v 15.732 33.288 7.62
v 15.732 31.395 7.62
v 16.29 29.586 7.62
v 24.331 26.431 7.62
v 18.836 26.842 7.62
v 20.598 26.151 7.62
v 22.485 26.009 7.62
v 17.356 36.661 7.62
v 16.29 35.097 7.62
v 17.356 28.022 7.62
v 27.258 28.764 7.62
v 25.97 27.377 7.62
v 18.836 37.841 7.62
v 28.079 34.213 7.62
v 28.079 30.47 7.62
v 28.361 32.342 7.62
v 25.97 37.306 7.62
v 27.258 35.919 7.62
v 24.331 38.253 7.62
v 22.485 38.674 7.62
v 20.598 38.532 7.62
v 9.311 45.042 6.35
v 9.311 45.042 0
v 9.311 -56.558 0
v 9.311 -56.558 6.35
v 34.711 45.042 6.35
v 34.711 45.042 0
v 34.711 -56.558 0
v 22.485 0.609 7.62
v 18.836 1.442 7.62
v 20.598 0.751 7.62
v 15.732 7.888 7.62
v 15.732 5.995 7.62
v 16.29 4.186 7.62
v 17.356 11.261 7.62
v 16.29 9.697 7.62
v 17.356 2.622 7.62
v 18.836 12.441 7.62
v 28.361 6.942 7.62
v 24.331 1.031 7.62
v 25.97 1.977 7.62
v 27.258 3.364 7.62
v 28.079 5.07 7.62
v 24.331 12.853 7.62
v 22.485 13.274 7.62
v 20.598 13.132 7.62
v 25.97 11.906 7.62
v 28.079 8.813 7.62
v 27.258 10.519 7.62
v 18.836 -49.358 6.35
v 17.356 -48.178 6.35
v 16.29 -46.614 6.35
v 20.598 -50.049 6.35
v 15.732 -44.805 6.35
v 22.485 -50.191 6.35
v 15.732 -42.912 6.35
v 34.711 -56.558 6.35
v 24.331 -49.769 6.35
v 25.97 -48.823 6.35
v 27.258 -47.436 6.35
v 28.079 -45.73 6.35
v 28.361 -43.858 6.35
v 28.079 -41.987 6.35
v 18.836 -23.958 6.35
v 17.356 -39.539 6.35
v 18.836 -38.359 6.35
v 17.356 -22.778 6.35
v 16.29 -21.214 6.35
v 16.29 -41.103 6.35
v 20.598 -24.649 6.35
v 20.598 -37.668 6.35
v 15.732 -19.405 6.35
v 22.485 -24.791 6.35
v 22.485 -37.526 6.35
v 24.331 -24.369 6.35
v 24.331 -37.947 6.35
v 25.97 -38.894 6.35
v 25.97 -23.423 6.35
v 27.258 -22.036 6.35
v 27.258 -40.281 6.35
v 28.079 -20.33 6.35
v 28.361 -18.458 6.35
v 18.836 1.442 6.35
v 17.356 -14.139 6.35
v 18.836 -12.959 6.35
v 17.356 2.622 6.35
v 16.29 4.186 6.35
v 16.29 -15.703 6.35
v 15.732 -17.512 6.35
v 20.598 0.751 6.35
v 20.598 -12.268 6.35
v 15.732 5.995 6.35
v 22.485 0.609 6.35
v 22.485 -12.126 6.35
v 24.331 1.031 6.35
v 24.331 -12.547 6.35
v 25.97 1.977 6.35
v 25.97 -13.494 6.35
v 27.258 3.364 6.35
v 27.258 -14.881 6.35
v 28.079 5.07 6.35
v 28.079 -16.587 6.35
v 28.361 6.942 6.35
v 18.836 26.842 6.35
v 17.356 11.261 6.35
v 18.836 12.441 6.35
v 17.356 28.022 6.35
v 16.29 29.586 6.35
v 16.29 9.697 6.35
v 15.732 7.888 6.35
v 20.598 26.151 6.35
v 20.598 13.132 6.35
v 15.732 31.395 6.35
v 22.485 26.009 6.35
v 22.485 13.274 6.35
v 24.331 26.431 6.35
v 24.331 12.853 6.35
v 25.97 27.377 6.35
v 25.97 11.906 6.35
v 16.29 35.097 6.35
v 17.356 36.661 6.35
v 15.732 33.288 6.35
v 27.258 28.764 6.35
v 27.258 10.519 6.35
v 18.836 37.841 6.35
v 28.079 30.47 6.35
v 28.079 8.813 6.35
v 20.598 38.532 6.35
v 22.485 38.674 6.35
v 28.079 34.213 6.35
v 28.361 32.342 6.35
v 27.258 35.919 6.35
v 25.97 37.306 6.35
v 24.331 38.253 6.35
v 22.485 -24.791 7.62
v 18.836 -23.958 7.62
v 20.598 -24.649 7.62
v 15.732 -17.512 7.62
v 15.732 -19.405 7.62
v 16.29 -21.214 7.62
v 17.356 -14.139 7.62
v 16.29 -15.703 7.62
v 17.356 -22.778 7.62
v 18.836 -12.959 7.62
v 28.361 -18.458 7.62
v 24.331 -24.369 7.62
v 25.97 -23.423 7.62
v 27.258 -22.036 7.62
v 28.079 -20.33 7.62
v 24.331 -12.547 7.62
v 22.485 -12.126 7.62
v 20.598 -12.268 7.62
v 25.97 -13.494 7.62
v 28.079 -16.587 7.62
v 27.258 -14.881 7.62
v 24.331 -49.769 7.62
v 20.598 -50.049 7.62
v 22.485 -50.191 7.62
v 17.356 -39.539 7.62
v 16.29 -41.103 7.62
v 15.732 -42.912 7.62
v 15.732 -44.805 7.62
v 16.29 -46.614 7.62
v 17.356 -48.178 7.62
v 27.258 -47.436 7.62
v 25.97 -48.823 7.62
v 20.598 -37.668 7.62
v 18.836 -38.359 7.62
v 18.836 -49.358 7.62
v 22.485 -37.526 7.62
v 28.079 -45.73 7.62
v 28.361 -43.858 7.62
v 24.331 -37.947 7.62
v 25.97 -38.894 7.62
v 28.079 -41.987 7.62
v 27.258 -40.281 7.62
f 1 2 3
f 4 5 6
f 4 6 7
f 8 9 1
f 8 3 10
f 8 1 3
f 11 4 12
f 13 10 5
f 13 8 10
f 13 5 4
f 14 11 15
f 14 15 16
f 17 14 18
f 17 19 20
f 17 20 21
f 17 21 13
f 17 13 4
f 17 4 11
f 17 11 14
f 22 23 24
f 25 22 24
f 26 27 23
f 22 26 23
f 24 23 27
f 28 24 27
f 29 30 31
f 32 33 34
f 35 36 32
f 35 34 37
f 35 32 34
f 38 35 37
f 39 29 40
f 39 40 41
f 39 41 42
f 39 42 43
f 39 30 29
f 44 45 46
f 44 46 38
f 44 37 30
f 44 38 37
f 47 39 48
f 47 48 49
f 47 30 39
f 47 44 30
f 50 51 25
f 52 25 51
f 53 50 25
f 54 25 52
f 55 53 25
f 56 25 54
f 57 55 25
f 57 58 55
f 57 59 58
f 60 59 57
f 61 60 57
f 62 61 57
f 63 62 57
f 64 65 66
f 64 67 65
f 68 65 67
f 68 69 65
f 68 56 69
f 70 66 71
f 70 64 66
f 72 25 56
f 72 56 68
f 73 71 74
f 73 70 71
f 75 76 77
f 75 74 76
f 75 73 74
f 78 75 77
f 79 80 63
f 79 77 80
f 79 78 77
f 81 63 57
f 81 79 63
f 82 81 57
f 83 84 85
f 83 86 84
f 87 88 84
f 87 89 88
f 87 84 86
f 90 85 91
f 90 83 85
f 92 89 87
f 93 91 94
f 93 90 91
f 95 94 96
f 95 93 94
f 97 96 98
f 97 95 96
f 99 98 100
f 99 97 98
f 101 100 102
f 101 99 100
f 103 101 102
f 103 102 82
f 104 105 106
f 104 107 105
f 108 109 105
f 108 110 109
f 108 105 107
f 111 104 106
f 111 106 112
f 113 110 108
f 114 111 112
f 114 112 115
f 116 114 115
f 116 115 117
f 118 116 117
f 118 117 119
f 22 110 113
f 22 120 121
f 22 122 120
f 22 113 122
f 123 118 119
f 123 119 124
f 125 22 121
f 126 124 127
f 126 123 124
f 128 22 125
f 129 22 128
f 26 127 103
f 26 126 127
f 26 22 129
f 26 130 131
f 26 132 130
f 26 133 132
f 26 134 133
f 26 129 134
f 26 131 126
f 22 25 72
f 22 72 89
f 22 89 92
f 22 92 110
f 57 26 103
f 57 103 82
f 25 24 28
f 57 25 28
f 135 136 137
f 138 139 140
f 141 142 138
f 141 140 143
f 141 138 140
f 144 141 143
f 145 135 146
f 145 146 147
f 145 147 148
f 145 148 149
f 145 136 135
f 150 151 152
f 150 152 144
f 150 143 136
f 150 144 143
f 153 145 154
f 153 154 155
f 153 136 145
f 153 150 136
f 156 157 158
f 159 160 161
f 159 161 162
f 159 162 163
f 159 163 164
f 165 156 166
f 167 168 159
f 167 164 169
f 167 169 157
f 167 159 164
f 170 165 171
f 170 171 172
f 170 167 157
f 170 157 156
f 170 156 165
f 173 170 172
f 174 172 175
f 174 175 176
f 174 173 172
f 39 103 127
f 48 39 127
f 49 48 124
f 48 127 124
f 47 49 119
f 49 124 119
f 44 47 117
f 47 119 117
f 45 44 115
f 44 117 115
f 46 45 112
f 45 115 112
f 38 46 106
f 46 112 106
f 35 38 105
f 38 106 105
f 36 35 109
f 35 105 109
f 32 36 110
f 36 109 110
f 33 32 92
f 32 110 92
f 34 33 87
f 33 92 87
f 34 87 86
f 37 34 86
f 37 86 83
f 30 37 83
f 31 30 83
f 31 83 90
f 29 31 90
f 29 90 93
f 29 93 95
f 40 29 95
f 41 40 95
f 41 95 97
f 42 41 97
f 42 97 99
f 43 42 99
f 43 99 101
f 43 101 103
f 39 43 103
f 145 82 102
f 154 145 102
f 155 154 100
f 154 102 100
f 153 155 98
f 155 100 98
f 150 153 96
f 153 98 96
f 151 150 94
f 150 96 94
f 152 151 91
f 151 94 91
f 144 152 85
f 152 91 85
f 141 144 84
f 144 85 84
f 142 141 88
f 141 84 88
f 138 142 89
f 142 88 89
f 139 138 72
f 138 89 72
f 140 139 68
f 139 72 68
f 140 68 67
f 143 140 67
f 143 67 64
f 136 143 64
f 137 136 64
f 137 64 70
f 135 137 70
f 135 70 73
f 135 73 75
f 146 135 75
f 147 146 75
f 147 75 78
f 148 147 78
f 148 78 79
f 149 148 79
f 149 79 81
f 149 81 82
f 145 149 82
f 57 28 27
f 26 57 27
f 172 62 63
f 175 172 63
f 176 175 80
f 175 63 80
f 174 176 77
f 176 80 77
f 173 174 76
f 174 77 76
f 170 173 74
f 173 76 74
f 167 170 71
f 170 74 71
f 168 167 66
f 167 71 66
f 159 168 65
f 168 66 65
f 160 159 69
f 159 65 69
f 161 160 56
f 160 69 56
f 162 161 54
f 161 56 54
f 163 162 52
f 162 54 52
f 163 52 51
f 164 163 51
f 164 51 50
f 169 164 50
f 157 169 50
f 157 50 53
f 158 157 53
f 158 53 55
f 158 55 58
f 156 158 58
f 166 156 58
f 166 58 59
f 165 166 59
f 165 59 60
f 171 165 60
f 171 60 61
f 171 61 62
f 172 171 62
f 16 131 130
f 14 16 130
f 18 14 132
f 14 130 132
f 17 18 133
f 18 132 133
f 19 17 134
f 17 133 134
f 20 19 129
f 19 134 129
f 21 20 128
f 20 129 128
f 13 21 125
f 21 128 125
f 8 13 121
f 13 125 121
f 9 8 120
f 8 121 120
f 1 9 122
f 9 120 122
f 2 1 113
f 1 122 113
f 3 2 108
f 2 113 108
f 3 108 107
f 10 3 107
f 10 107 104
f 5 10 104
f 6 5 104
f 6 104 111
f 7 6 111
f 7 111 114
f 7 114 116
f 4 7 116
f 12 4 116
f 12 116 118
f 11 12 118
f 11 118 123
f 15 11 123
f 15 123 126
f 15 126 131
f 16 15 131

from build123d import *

# Parameters (mm, degrees)
F0_R     = 6.35
F1_DEPTH = 6.35
F2_DEPTH = 7.62


with BuildPart() as f1:
    # F0 (on Top) → F1 (new body)
    with BuildSketch(Plane.XY):
        Polygon((34.710955, 45.041551), (9.310955, 45.041551), (9.310955, 32.341551), (9.310955, 6.941551), (9.310955, -18.458449), (9.310955, -43.858449), (9.310955, -56.558449), (34.710955, -56.558449), align=None)
        with Locations((22.010955, -43.858449)):
            Circle(F0_R, mode=Mode.SUBTRACT)
        with Locations((22.010955, -18.458449)):
            Circle(F0_R, mode=Mode.SUBTRACT)
        with Locations((22.010955, 6.941551)):
            Circle(F0_R, mode=Mode.SUBTRACT)
        with Locations((22.010955, 32.341551)):
            Circle(F0_R, mode=Mode.SUBTRACT)
    extrude(amount=F1_DEPTH)

    # F0 (on Top) → F2 (join)
    with BuildSketch(Plane.XY):
        with Locations((22.010955, -18.458449)):
            Circle(F0_R)
        with Locations((22.010955, -43.858449)):
            Circle(F0_R)
        with Locations((22.010955, 6.941551)):
            Circle(F0_R)
        with Locations((22.010955, 32.341551)):
            Circle(F0_R)
    extrude(amount=F2_DEPTH)


solid = f1.part
